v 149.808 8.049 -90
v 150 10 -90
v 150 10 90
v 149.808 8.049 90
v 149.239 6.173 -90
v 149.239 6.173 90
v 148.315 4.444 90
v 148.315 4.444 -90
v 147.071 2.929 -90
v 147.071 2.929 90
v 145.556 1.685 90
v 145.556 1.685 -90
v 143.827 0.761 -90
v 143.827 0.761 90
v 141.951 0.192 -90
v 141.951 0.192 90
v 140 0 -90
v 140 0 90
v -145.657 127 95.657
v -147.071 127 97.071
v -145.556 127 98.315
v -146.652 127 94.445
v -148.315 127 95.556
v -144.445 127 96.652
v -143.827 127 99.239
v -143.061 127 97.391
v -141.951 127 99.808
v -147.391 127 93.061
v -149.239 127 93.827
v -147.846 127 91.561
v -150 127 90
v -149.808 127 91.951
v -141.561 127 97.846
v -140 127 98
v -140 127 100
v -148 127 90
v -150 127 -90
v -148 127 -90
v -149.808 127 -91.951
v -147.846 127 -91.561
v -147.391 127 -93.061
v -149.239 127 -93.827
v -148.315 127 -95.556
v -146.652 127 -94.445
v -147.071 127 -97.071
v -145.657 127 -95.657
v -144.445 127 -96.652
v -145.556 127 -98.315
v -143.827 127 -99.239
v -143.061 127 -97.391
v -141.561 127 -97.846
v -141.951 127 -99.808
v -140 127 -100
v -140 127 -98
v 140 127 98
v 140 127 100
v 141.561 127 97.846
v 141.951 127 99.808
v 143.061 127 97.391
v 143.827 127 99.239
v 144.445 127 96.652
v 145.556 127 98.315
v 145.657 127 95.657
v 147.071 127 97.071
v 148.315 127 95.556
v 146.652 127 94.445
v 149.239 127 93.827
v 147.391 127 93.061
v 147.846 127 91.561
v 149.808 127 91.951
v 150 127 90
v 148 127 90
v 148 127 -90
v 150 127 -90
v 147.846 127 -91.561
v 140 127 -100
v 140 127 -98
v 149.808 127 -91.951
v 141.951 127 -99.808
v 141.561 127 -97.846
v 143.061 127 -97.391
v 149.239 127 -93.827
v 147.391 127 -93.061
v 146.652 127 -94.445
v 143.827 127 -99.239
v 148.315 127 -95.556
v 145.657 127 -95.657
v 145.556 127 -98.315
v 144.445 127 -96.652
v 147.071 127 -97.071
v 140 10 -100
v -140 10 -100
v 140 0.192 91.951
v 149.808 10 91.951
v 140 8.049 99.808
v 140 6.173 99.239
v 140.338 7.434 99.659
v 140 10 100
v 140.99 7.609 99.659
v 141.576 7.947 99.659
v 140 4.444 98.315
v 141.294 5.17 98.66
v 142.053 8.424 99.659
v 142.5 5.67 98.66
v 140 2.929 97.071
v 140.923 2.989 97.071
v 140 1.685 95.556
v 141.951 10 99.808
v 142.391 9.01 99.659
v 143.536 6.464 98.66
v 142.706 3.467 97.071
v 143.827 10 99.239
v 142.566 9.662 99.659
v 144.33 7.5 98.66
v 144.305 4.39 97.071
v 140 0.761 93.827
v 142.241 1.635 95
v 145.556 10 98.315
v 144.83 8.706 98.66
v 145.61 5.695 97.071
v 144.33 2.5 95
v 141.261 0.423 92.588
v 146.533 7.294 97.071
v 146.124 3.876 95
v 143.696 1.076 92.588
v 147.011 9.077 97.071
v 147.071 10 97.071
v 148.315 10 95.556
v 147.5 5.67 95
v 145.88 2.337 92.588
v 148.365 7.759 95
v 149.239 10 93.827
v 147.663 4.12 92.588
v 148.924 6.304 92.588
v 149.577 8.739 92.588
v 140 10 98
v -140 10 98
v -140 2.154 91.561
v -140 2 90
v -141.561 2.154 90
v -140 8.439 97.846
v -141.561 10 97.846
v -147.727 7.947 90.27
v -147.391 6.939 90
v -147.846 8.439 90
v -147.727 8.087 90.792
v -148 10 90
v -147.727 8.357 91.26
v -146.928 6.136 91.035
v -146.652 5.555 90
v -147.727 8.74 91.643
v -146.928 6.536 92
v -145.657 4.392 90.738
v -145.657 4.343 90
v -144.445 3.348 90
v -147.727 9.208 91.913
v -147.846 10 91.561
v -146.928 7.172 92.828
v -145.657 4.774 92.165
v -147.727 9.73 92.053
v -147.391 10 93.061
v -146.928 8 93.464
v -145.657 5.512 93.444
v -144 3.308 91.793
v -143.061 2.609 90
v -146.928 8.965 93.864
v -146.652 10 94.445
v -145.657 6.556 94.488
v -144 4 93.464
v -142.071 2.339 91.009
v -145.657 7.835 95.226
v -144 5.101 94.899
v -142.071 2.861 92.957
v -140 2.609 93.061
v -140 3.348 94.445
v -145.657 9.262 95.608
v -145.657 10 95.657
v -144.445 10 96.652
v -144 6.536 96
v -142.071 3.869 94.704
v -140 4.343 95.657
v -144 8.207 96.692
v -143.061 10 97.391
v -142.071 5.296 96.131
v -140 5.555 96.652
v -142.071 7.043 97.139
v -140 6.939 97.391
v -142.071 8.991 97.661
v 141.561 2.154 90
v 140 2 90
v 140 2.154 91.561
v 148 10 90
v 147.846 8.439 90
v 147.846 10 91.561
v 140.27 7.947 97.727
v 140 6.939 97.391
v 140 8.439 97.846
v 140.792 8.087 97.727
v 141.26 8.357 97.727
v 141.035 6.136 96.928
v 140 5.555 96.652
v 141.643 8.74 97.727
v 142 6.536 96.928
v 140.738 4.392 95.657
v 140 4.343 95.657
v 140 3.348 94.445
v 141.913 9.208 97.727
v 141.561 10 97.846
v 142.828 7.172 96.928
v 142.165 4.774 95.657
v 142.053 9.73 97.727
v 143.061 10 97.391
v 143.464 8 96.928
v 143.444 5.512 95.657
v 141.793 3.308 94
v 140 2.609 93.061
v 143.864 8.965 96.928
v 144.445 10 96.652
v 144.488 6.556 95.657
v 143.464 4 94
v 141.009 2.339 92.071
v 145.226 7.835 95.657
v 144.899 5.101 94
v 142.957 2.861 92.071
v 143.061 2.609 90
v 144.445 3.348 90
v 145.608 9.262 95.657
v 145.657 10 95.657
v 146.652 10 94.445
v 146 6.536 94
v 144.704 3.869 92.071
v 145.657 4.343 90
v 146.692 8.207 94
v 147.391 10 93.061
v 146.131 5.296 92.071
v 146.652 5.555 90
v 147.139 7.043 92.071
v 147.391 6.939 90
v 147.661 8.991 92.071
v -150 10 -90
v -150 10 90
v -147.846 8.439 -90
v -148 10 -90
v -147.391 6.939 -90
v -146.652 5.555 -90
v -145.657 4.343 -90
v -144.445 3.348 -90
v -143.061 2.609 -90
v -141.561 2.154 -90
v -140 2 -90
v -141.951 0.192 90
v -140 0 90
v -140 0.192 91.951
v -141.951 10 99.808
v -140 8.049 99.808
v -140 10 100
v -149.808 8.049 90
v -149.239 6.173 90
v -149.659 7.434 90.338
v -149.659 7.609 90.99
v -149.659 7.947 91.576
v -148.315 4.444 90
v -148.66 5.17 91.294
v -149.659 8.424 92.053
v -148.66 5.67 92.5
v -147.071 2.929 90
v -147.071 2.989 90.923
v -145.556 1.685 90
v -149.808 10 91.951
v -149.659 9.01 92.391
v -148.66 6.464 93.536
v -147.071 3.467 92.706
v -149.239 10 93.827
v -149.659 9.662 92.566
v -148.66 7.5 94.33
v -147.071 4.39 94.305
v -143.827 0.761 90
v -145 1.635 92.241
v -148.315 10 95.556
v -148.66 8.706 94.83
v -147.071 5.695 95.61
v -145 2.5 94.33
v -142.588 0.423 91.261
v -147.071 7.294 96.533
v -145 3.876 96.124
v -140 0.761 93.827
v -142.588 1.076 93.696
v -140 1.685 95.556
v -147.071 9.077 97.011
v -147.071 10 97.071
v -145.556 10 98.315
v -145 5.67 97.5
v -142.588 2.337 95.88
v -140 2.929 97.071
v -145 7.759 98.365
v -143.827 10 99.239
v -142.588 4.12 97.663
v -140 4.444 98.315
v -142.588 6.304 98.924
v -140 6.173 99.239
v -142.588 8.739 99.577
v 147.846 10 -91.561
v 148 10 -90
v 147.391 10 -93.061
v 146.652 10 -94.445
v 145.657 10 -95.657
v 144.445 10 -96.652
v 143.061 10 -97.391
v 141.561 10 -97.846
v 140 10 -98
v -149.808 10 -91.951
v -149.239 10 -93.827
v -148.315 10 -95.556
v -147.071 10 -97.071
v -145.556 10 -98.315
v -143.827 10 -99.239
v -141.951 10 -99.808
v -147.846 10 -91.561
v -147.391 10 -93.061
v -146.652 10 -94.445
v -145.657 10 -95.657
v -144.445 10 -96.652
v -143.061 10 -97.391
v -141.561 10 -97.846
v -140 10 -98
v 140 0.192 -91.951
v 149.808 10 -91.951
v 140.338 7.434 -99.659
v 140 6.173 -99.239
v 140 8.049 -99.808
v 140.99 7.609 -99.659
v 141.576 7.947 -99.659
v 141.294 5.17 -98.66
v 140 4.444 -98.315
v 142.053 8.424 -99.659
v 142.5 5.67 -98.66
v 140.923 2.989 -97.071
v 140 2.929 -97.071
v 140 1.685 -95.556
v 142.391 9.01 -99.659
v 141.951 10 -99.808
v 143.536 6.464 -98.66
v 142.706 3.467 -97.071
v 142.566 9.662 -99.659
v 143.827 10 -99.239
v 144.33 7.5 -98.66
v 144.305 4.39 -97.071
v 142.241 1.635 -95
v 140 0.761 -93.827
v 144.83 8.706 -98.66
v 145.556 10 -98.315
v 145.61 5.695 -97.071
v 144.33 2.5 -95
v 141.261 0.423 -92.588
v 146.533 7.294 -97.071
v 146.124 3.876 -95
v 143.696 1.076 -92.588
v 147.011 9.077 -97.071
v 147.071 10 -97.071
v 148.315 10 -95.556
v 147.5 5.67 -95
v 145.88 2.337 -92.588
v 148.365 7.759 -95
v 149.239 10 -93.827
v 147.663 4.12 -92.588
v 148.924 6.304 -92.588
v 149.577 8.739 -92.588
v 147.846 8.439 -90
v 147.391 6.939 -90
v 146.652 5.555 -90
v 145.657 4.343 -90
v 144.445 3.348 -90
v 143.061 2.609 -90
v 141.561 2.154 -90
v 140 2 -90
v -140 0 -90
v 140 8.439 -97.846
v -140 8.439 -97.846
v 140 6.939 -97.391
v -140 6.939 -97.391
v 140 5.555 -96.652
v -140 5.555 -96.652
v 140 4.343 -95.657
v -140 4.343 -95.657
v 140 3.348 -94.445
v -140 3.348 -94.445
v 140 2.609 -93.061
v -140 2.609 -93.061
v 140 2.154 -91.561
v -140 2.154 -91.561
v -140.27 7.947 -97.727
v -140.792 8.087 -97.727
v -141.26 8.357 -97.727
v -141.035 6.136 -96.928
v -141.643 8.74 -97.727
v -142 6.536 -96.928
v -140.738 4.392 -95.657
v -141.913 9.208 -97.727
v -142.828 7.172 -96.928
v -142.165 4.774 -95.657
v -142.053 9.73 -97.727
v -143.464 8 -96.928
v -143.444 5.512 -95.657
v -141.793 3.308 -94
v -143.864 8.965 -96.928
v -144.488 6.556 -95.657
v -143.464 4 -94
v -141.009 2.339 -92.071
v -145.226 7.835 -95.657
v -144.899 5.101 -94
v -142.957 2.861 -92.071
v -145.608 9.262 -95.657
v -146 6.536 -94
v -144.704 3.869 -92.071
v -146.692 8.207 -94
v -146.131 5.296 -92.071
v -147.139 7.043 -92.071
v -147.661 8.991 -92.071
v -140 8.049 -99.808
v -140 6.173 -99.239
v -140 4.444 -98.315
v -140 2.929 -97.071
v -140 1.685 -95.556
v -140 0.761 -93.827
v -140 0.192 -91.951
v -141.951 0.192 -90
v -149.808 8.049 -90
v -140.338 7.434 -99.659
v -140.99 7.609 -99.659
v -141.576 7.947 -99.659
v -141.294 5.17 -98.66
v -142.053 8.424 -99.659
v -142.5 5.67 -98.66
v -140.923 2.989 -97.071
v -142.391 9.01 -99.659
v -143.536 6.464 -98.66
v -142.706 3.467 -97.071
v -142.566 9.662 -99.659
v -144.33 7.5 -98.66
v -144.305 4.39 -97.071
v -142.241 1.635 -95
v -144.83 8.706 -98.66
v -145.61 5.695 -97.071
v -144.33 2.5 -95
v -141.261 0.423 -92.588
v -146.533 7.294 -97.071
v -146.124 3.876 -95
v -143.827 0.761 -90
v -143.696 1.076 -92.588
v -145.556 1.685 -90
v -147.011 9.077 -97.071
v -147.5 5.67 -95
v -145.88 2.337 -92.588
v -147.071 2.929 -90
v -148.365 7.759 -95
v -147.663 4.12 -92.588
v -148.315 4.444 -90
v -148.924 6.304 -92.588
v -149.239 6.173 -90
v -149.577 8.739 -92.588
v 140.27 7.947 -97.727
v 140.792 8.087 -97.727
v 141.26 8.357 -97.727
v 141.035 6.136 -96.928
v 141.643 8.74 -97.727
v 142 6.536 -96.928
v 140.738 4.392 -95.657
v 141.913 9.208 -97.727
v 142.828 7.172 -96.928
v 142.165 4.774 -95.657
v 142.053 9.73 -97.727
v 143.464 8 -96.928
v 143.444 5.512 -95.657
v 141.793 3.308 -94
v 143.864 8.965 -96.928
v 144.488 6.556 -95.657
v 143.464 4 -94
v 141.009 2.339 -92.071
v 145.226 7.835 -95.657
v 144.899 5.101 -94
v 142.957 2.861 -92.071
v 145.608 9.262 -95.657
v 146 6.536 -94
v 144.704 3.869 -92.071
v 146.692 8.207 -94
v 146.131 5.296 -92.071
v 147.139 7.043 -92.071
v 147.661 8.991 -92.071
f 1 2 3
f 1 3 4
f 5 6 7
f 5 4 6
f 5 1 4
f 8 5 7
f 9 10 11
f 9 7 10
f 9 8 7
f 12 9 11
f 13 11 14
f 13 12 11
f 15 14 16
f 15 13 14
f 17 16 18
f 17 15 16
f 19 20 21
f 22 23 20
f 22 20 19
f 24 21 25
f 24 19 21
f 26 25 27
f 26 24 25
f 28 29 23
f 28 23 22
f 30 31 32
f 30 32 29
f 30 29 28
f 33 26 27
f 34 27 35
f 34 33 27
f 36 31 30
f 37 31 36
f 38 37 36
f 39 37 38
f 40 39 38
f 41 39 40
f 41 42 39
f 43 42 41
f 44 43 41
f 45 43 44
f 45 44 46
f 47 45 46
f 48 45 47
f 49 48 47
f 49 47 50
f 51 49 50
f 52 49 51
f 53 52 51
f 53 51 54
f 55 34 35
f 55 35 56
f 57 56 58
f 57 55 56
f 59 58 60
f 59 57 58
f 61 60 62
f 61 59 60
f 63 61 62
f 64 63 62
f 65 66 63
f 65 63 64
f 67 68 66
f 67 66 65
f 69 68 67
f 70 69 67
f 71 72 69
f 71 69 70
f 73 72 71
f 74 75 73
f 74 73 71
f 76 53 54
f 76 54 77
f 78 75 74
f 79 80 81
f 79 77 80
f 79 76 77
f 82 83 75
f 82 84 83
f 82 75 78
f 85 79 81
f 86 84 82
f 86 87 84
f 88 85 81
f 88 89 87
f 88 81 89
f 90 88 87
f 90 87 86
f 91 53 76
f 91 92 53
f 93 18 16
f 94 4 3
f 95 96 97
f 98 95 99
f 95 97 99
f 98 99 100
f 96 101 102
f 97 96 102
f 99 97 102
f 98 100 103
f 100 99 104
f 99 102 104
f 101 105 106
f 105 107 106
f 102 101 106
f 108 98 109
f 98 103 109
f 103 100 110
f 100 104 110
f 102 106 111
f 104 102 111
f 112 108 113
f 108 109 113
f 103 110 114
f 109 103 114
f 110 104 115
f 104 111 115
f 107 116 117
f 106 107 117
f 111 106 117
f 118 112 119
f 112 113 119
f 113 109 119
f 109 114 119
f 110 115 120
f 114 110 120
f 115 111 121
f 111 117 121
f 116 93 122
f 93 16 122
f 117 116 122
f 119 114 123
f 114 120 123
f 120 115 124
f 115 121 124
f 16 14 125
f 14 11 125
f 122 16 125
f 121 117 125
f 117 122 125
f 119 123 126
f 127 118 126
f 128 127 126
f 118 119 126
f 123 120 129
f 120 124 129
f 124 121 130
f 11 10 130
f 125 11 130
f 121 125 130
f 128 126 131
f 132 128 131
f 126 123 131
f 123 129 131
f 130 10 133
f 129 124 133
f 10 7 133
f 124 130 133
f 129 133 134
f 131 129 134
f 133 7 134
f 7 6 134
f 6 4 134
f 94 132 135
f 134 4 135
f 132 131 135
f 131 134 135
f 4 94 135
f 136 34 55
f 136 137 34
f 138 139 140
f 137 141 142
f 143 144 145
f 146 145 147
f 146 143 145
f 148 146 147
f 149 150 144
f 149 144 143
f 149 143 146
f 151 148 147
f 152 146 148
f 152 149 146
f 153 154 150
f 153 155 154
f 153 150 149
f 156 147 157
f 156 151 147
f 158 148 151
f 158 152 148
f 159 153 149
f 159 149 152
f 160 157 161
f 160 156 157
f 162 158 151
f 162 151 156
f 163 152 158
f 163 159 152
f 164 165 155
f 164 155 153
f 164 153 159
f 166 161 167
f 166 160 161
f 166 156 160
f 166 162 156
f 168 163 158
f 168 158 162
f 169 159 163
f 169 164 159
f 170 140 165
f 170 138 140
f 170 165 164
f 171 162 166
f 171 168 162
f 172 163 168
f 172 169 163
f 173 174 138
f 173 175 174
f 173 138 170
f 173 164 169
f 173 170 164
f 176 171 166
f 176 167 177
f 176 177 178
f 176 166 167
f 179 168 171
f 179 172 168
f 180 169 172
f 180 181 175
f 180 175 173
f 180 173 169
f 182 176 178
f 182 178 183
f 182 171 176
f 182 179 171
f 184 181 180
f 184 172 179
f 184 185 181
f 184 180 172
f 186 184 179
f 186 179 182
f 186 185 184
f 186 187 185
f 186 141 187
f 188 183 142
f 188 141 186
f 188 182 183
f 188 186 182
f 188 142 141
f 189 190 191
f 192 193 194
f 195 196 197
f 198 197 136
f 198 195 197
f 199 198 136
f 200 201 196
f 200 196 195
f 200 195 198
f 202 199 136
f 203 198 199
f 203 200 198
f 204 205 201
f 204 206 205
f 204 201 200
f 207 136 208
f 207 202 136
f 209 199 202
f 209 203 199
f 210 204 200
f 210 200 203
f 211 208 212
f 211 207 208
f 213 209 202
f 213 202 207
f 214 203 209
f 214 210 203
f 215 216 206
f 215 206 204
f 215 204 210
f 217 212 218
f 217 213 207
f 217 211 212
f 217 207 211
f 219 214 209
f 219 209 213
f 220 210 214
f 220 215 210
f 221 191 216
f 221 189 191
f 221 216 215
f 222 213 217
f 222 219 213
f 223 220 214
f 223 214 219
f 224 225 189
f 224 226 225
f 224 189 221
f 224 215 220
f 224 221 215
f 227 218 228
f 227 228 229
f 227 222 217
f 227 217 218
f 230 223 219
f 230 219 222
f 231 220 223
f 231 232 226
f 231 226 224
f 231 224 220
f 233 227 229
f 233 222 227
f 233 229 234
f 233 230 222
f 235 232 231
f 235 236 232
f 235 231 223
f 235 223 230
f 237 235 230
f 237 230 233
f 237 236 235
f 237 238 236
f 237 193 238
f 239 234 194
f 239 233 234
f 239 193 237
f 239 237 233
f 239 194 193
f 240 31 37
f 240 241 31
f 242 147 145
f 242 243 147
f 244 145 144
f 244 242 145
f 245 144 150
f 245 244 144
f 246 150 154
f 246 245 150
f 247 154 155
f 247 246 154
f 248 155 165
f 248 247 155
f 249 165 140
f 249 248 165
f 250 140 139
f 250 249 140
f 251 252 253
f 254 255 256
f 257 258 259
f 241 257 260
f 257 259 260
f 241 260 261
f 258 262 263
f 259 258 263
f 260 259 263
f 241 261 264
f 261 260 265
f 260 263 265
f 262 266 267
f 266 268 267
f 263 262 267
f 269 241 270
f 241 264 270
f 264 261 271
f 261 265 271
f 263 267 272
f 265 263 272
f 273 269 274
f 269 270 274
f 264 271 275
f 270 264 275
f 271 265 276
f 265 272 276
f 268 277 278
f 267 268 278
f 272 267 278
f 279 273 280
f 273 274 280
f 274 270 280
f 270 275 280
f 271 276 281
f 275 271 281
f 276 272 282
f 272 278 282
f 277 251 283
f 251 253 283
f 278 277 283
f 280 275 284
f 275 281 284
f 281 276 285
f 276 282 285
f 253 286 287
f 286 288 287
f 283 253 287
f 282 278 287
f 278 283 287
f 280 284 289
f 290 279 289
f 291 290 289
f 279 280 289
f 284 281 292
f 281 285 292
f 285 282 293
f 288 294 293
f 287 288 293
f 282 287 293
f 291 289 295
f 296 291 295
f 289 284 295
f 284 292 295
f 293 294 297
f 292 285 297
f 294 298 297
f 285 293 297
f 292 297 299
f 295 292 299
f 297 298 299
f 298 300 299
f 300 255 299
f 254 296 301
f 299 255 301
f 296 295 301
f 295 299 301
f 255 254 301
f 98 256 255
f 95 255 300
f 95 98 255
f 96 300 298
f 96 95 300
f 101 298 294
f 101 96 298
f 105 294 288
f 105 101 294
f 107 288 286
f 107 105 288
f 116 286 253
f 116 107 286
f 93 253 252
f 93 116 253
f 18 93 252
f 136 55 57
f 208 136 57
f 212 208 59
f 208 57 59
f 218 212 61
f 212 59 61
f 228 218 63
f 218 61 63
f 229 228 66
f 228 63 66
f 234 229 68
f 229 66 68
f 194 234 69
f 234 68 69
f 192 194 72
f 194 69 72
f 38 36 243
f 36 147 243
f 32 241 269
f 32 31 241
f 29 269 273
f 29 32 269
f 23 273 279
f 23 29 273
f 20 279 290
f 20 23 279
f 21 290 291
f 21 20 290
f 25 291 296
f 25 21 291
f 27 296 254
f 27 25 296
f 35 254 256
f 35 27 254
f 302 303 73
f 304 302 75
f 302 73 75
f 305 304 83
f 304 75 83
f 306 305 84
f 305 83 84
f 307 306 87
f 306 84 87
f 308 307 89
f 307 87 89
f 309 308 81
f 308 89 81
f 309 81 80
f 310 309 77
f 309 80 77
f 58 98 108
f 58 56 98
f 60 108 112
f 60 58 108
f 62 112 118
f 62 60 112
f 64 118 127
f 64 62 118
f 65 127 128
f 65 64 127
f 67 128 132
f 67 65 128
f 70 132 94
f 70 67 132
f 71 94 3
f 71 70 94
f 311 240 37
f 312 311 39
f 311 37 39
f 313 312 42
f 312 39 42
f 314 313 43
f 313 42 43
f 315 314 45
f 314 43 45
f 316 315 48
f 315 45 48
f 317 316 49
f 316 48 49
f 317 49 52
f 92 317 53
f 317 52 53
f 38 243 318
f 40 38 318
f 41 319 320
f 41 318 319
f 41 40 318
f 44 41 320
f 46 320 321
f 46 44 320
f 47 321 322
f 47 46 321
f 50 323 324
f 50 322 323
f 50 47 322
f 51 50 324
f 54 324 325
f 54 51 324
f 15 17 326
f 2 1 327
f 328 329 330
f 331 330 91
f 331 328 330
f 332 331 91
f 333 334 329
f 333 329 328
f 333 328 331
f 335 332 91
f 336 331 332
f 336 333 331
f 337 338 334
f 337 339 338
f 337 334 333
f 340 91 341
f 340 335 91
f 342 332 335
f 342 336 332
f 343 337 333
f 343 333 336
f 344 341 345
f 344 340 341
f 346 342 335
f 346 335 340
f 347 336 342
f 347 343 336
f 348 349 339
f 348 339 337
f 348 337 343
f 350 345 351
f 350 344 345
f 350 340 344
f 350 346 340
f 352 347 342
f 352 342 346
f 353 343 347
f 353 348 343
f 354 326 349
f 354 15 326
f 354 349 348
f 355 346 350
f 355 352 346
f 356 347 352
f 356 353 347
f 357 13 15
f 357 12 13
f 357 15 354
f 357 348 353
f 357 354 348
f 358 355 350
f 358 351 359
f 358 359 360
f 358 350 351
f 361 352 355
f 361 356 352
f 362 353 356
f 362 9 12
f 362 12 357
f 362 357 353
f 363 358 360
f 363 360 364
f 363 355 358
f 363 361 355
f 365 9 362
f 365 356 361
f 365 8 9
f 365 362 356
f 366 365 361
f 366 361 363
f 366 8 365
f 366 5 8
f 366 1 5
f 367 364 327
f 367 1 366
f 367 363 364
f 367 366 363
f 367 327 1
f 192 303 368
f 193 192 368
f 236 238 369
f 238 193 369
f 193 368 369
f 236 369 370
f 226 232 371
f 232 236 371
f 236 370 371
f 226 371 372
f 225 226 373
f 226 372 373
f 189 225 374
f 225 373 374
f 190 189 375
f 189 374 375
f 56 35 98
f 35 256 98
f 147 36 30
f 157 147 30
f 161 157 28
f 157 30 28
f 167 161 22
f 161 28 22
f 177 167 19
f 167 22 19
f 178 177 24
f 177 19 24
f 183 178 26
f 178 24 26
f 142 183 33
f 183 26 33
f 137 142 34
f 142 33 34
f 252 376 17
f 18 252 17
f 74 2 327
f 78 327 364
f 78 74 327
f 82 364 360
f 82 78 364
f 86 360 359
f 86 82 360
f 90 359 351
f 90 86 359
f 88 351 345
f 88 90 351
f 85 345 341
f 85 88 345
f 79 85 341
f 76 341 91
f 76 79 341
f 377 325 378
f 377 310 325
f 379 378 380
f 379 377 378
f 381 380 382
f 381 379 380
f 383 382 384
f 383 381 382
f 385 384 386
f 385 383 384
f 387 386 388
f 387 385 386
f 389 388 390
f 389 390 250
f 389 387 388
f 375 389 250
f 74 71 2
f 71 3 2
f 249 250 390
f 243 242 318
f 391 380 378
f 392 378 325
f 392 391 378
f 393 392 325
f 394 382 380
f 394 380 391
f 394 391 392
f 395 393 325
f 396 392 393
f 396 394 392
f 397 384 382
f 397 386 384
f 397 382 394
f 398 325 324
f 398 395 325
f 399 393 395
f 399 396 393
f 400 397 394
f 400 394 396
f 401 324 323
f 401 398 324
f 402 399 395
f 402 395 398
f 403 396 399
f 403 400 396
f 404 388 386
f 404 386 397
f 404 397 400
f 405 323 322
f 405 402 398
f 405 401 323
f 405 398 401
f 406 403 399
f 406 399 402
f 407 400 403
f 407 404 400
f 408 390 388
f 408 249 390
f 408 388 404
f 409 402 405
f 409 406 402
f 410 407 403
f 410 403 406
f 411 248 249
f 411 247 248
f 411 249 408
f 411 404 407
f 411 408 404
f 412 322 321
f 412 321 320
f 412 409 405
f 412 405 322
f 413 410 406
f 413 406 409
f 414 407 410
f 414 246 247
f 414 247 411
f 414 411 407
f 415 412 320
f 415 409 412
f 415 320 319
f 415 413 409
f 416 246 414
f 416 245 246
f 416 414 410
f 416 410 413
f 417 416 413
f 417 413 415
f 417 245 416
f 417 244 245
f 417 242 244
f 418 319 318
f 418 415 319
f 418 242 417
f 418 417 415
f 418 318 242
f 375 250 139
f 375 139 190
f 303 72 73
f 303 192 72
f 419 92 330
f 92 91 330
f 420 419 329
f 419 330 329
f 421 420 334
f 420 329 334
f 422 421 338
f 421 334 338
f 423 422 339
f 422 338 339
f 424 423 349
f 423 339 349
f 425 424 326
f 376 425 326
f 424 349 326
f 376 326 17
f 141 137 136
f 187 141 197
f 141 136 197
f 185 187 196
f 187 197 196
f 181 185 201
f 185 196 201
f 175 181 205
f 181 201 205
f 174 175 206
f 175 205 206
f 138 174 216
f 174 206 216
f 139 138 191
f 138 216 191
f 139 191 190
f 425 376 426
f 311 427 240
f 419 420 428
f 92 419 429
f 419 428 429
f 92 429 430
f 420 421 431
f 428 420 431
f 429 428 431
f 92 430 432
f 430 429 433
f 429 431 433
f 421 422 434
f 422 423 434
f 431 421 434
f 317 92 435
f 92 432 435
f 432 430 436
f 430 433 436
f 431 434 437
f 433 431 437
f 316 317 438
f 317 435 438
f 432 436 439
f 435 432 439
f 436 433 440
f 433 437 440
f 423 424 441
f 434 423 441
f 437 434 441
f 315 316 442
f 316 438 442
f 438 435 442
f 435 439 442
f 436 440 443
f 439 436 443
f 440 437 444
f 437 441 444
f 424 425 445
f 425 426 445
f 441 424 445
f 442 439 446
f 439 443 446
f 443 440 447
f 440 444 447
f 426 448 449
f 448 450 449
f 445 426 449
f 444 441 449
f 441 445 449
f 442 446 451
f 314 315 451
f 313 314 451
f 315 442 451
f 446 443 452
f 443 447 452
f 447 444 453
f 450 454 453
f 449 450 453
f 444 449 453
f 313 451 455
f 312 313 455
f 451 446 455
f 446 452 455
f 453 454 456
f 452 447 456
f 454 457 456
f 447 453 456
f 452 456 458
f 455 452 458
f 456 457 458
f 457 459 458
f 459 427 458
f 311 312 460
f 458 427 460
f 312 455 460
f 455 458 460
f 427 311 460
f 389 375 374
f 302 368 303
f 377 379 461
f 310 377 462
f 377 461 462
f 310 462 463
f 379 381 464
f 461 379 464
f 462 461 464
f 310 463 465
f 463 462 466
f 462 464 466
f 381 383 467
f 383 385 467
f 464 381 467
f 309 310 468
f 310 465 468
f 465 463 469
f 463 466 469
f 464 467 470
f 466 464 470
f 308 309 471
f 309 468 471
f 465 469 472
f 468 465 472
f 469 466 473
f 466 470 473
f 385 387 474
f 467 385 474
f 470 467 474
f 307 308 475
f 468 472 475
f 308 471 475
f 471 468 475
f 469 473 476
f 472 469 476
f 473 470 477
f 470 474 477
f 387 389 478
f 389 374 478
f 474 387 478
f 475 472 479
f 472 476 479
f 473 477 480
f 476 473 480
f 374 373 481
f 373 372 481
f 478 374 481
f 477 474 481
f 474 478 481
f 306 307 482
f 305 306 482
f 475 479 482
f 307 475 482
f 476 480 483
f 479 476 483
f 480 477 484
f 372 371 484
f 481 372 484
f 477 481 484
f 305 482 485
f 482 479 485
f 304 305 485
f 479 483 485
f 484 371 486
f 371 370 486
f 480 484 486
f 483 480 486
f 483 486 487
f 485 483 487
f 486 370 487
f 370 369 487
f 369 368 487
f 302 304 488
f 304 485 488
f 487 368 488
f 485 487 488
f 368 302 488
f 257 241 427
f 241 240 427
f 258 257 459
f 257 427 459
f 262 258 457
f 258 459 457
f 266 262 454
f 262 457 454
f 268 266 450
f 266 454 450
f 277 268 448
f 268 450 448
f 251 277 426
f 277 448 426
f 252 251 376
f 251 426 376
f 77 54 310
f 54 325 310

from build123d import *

# Parameters (mm, degrees)
SKETCH1_W           = 300
SKETCH1_H           = 200
BOSS_EXTRUDE1_DEPTH = 127
FILLET1_R           = 10
SHELL1_T            = -2


with BuildPart() as part:
    # Sketch1 → Boss-Extrude1 (new body)
    with BuildSketch(Plane(origin=(0, 0, 0), x_dir=(1, 0, 0), z_dir=(0, 1, 0))):
        Rectangle(SKETCH1_W, SKETCH1_H)
    extrude(amount=BOSS_EXTRUDE1_DEPTH)

    # Fillet1
    fillet1_edges = [part.edges().sort_by_distance(p)[0] for p in [
        (150, 0, 0),
        (0, 0, 100),
        (-150, 0, 0),
        (0, 0, -100),
        (150, 63.5, -100),
        (150, 63.5, 100),
        (-150, 63.5, 100),
        (-150, 63.5, -100),
    ]]
    fillet(fillet1_edges, radius=FILLET1_R)

    # Shell1
    shell1_openings = [part.faces().sort_by_distance(p)[0] for p in [
        (0, 127, 0),
    ]]
    offset(amount=SHELL1_T, openings=shell1_openings, kind=Kind.INTERSECTION)


solid = part.part
